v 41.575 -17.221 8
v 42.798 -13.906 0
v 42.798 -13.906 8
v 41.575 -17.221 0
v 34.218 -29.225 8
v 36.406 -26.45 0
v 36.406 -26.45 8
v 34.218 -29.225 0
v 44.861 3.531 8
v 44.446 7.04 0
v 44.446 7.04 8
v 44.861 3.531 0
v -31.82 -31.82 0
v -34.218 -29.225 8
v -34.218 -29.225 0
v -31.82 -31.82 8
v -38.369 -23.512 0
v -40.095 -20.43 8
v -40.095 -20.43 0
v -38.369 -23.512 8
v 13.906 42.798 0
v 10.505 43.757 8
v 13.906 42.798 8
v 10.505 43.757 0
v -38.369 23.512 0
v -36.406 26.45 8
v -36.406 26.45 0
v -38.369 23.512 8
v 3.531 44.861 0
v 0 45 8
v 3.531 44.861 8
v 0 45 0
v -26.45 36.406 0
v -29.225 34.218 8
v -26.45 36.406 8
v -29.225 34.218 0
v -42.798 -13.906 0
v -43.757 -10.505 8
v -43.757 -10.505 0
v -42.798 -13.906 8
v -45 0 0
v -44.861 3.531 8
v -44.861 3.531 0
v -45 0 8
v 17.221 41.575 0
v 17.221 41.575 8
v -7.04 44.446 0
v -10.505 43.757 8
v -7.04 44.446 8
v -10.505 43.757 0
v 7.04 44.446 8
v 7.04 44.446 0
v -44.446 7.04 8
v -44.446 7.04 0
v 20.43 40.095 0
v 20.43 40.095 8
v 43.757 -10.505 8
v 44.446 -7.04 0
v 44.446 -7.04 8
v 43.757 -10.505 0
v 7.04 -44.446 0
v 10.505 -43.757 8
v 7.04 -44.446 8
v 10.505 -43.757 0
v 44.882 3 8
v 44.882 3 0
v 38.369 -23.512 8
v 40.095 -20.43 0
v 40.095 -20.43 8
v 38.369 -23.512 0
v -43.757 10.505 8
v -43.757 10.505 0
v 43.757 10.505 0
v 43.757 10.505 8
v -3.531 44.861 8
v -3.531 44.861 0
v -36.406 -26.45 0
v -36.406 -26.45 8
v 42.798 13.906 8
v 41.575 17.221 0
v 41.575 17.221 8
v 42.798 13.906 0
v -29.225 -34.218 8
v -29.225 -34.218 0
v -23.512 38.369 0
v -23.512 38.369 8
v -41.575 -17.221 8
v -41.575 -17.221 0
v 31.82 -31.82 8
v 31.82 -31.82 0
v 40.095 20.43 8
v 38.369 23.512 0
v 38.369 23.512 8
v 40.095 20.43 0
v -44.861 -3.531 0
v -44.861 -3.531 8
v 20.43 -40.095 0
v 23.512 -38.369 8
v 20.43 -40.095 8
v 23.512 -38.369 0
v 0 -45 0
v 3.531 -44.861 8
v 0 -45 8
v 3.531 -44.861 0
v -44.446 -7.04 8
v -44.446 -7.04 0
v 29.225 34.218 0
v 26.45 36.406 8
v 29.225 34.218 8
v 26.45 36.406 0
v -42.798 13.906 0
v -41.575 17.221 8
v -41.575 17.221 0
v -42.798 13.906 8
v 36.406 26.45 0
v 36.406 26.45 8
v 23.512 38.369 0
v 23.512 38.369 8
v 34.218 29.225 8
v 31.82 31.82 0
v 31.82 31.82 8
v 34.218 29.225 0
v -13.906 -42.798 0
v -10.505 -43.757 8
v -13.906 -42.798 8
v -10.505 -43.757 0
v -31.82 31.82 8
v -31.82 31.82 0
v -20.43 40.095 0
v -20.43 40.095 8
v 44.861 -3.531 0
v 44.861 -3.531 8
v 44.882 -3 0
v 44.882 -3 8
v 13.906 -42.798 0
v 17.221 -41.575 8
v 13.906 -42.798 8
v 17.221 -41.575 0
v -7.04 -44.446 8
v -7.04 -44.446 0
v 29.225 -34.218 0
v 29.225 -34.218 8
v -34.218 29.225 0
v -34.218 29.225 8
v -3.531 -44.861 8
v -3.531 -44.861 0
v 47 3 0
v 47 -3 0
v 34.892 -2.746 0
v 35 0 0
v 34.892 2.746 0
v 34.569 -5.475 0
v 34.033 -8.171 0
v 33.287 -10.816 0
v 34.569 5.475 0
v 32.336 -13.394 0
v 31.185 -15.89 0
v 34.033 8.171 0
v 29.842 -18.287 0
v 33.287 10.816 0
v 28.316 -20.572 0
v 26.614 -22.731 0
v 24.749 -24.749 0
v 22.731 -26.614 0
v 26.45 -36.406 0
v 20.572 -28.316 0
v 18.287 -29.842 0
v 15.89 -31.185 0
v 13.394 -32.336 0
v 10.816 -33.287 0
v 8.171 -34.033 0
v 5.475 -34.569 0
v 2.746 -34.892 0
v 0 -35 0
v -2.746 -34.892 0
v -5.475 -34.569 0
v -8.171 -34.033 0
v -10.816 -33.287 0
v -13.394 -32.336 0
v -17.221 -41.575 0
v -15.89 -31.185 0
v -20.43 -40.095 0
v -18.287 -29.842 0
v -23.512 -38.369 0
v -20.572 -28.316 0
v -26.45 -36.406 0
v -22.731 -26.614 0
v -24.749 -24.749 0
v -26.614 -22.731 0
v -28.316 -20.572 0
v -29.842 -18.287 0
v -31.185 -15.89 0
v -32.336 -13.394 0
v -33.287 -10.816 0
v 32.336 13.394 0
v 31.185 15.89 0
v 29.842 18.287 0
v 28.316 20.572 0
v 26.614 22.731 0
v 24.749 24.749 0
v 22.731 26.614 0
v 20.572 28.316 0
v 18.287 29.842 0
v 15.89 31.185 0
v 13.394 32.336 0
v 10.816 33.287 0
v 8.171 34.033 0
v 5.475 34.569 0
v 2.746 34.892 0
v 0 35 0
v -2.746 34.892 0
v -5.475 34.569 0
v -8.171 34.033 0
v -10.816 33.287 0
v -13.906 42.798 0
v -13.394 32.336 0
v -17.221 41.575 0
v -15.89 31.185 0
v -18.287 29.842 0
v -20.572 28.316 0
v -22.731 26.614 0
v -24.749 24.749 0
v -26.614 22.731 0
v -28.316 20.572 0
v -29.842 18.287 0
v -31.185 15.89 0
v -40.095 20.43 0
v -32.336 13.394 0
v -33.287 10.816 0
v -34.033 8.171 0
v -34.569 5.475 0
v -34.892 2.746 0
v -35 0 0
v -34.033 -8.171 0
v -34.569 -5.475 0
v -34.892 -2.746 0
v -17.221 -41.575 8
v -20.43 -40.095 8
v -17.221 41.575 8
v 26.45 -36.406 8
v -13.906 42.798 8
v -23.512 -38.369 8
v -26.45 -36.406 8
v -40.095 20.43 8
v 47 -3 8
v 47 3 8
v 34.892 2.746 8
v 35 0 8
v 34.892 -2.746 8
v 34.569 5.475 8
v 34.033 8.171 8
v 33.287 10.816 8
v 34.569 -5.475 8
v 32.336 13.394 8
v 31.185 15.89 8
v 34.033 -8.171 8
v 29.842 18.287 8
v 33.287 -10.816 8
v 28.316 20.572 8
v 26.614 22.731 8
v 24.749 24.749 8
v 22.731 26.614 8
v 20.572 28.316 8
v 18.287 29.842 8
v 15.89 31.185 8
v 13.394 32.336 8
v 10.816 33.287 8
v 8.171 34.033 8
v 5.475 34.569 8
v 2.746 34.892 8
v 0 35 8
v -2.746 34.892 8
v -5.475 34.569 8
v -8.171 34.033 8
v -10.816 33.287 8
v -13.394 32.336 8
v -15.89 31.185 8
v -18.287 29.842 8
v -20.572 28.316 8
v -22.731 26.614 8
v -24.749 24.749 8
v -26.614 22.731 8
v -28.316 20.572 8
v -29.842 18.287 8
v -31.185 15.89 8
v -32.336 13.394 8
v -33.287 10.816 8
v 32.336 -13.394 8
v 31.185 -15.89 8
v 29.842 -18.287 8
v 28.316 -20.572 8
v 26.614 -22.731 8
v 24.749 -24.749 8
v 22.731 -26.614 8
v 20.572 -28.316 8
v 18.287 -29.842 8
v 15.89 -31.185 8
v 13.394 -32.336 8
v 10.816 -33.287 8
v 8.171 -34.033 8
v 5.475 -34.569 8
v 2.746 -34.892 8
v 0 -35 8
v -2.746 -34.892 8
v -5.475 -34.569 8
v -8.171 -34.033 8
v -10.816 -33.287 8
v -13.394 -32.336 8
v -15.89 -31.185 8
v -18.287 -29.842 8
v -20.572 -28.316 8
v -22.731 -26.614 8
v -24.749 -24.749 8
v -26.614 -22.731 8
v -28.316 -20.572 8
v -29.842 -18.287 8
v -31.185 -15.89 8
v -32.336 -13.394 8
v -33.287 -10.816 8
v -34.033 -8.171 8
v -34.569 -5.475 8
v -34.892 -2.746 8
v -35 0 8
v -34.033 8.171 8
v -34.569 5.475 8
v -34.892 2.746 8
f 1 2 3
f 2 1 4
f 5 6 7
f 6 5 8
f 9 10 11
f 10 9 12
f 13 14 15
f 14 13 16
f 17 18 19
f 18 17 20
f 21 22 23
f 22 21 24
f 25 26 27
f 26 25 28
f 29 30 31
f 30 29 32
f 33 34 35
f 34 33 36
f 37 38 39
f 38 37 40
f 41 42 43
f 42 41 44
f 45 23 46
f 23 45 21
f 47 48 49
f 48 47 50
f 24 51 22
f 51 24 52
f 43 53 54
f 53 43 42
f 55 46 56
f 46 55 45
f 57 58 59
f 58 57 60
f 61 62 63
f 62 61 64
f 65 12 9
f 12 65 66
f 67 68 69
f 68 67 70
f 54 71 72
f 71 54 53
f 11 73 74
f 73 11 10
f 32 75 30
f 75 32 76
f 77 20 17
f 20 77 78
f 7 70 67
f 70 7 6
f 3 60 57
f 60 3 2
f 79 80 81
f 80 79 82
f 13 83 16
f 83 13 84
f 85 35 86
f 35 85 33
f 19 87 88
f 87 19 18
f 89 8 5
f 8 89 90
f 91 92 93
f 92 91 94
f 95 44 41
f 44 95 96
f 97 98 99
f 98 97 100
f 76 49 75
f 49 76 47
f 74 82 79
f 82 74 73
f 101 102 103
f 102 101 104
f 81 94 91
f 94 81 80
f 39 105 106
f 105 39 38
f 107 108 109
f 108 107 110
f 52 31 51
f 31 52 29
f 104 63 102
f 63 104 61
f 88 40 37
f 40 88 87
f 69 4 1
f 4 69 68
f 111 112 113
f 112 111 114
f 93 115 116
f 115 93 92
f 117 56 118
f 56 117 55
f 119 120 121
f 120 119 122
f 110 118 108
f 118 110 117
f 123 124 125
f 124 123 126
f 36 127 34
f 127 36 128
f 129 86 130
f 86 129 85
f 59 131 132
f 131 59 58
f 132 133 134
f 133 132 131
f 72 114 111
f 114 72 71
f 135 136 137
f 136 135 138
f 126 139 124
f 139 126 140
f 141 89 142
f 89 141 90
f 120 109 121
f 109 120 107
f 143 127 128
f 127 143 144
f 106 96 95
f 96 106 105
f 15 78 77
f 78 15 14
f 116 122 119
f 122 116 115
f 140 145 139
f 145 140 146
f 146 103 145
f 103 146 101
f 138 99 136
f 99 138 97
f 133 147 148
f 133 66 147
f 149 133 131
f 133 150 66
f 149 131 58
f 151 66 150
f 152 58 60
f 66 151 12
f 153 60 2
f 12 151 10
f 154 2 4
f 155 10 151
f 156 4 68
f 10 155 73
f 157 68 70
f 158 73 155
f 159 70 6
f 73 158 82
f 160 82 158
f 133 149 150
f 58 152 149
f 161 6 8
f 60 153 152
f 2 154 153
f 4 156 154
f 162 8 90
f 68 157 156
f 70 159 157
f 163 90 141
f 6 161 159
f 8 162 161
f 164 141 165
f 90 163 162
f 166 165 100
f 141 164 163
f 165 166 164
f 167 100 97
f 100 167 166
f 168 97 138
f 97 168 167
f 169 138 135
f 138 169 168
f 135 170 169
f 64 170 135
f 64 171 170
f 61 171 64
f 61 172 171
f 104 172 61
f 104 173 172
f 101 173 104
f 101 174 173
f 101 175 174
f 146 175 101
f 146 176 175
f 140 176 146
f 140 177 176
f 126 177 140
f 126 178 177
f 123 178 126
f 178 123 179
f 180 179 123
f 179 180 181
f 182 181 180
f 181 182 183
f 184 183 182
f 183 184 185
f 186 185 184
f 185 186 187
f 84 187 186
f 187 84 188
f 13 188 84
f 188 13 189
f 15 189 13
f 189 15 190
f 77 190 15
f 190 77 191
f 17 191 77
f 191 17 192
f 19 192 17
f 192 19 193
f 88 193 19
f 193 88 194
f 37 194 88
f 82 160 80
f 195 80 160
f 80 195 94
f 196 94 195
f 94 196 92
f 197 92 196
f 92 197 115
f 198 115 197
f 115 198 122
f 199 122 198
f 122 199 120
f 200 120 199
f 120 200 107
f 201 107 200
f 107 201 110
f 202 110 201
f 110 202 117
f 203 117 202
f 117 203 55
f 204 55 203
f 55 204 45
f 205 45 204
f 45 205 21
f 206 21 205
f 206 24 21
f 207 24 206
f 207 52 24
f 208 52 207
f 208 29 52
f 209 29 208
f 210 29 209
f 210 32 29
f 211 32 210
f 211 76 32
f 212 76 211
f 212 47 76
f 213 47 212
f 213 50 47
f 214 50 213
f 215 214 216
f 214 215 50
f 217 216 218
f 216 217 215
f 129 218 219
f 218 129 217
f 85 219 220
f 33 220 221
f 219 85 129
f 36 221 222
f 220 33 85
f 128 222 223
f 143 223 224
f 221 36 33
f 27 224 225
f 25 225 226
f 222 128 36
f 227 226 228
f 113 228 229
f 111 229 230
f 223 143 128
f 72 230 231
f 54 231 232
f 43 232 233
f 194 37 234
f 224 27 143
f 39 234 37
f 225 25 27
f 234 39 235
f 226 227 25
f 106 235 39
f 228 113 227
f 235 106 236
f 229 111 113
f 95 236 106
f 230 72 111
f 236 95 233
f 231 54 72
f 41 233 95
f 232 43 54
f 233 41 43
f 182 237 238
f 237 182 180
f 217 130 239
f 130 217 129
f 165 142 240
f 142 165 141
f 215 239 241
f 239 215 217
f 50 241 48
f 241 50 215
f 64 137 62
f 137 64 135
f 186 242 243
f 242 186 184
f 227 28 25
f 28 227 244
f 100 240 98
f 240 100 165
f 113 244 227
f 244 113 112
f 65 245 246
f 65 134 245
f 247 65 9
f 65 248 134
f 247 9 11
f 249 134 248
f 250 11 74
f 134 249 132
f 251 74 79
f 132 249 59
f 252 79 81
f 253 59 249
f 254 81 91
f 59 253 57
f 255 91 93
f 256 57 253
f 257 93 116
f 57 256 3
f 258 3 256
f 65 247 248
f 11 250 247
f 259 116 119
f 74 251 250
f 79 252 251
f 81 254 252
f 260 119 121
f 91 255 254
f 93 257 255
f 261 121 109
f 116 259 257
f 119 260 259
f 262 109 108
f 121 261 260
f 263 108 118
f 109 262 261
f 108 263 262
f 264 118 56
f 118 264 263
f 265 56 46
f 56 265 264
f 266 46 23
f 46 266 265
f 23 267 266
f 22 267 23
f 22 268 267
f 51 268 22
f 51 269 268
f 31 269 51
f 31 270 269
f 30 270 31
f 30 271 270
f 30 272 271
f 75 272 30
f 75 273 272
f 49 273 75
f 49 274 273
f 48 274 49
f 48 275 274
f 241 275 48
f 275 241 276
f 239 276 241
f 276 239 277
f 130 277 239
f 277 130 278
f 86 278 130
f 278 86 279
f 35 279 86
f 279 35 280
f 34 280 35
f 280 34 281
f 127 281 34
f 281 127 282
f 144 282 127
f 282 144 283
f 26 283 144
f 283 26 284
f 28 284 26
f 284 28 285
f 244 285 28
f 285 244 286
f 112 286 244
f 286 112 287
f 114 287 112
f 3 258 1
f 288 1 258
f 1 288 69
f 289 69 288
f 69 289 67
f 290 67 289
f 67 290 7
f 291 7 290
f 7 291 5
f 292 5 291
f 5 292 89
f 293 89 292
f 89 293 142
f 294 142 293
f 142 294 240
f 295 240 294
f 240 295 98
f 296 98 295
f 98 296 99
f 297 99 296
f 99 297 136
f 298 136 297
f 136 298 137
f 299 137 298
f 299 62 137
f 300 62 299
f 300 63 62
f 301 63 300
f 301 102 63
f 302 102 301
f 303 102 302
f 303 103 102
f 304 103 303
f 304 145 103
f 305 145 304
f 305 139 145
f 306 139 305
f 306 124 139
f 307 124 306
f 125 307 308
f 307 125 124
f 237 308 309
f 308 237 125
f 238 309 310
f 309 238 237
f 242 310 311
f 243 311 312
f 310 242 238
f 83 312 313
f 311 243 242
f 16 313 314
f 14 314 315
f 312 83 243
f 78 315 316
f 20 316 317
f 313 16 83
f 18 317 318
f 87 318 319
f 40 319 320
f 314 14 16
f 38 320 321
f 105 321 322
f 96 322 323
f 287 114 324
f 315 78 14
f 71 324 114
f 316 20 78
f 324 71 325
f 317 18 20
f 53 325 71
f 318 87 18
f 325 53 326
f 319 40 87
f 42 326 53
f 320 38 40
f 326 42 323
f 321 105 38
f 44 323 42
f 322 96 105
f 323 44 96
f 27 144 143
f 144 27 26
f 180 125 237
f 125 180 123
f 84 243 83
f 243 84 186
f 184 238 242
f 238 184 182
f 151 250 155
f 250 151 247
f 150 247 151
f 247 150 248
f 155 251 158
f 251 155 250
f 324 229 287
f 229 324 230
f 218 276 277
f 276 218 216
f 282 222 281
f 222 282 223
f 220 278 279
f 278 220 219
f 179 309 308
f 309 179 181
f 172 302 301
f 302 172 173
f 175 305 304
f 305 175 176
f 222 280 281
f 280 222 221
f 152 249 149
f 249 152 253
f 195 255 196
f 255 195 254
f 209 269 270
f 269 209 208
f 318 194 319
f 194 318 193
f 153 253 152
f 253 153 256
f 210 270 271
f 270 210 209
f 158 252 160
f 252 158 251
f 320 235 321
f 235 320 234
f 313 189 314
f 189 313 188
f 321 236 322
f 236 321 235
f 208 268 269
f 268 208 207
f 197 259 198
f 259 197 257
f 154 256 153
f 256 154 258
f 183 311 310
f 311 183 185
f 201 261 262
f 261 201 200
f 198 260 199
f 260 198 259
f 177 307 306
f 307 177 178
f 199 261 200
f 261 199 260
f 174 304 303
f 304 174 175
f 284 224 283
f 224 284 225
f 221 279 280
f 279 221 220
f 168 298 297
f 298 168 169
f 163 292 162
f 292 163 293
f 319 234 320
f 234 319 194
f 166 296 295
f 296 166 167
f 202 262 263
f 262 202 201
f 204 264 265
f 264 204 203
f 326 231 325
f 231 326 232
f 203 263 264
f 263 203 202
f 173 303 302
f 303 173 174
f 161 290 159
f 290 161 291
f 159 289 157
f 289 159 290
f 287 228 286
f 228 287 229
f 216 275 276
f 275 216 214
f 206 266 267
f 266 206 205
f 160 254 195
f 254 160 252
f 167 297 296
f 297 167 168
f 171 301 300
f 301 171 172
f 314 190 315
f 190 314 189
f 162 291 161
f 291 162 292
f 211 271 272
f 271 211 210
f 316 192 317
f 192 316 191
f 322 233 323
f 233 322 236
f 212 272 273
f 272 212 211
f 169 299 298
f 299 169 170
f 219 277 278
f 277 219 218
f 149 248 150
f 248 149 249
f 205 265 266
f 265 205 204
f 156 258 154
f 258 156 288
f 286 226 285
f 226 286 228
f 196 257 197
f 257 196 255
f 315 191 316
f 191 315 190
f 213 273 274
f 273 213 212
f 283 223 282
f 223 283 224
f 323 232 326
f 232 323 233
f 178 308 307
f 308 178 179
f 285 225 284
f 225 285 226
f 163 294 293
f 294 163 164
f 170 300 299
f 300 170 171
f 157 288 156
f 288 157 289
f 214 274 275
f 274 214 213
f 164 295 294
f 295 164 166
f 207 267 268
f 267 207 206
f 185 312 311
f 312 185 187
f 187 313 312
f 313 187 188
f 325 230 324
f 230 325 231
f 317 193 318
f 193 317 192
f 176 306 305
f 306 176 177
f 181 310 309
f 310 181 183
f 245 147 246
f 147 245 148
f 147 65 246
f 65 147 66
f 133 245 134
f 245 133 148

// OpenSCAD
// LED lure bezel for console — blue-visible ring mount
$fn = 80;
outer = 90;
inner = 70;
h = 8;
difference() {
    cylinder(h=h, d=outer);
    translate([0,0,-1]) cylinder(h=h+2, d=inner);
}
// cable notch
translate([outer/2-6, -3, 0]) cube([8, 6, h]);
